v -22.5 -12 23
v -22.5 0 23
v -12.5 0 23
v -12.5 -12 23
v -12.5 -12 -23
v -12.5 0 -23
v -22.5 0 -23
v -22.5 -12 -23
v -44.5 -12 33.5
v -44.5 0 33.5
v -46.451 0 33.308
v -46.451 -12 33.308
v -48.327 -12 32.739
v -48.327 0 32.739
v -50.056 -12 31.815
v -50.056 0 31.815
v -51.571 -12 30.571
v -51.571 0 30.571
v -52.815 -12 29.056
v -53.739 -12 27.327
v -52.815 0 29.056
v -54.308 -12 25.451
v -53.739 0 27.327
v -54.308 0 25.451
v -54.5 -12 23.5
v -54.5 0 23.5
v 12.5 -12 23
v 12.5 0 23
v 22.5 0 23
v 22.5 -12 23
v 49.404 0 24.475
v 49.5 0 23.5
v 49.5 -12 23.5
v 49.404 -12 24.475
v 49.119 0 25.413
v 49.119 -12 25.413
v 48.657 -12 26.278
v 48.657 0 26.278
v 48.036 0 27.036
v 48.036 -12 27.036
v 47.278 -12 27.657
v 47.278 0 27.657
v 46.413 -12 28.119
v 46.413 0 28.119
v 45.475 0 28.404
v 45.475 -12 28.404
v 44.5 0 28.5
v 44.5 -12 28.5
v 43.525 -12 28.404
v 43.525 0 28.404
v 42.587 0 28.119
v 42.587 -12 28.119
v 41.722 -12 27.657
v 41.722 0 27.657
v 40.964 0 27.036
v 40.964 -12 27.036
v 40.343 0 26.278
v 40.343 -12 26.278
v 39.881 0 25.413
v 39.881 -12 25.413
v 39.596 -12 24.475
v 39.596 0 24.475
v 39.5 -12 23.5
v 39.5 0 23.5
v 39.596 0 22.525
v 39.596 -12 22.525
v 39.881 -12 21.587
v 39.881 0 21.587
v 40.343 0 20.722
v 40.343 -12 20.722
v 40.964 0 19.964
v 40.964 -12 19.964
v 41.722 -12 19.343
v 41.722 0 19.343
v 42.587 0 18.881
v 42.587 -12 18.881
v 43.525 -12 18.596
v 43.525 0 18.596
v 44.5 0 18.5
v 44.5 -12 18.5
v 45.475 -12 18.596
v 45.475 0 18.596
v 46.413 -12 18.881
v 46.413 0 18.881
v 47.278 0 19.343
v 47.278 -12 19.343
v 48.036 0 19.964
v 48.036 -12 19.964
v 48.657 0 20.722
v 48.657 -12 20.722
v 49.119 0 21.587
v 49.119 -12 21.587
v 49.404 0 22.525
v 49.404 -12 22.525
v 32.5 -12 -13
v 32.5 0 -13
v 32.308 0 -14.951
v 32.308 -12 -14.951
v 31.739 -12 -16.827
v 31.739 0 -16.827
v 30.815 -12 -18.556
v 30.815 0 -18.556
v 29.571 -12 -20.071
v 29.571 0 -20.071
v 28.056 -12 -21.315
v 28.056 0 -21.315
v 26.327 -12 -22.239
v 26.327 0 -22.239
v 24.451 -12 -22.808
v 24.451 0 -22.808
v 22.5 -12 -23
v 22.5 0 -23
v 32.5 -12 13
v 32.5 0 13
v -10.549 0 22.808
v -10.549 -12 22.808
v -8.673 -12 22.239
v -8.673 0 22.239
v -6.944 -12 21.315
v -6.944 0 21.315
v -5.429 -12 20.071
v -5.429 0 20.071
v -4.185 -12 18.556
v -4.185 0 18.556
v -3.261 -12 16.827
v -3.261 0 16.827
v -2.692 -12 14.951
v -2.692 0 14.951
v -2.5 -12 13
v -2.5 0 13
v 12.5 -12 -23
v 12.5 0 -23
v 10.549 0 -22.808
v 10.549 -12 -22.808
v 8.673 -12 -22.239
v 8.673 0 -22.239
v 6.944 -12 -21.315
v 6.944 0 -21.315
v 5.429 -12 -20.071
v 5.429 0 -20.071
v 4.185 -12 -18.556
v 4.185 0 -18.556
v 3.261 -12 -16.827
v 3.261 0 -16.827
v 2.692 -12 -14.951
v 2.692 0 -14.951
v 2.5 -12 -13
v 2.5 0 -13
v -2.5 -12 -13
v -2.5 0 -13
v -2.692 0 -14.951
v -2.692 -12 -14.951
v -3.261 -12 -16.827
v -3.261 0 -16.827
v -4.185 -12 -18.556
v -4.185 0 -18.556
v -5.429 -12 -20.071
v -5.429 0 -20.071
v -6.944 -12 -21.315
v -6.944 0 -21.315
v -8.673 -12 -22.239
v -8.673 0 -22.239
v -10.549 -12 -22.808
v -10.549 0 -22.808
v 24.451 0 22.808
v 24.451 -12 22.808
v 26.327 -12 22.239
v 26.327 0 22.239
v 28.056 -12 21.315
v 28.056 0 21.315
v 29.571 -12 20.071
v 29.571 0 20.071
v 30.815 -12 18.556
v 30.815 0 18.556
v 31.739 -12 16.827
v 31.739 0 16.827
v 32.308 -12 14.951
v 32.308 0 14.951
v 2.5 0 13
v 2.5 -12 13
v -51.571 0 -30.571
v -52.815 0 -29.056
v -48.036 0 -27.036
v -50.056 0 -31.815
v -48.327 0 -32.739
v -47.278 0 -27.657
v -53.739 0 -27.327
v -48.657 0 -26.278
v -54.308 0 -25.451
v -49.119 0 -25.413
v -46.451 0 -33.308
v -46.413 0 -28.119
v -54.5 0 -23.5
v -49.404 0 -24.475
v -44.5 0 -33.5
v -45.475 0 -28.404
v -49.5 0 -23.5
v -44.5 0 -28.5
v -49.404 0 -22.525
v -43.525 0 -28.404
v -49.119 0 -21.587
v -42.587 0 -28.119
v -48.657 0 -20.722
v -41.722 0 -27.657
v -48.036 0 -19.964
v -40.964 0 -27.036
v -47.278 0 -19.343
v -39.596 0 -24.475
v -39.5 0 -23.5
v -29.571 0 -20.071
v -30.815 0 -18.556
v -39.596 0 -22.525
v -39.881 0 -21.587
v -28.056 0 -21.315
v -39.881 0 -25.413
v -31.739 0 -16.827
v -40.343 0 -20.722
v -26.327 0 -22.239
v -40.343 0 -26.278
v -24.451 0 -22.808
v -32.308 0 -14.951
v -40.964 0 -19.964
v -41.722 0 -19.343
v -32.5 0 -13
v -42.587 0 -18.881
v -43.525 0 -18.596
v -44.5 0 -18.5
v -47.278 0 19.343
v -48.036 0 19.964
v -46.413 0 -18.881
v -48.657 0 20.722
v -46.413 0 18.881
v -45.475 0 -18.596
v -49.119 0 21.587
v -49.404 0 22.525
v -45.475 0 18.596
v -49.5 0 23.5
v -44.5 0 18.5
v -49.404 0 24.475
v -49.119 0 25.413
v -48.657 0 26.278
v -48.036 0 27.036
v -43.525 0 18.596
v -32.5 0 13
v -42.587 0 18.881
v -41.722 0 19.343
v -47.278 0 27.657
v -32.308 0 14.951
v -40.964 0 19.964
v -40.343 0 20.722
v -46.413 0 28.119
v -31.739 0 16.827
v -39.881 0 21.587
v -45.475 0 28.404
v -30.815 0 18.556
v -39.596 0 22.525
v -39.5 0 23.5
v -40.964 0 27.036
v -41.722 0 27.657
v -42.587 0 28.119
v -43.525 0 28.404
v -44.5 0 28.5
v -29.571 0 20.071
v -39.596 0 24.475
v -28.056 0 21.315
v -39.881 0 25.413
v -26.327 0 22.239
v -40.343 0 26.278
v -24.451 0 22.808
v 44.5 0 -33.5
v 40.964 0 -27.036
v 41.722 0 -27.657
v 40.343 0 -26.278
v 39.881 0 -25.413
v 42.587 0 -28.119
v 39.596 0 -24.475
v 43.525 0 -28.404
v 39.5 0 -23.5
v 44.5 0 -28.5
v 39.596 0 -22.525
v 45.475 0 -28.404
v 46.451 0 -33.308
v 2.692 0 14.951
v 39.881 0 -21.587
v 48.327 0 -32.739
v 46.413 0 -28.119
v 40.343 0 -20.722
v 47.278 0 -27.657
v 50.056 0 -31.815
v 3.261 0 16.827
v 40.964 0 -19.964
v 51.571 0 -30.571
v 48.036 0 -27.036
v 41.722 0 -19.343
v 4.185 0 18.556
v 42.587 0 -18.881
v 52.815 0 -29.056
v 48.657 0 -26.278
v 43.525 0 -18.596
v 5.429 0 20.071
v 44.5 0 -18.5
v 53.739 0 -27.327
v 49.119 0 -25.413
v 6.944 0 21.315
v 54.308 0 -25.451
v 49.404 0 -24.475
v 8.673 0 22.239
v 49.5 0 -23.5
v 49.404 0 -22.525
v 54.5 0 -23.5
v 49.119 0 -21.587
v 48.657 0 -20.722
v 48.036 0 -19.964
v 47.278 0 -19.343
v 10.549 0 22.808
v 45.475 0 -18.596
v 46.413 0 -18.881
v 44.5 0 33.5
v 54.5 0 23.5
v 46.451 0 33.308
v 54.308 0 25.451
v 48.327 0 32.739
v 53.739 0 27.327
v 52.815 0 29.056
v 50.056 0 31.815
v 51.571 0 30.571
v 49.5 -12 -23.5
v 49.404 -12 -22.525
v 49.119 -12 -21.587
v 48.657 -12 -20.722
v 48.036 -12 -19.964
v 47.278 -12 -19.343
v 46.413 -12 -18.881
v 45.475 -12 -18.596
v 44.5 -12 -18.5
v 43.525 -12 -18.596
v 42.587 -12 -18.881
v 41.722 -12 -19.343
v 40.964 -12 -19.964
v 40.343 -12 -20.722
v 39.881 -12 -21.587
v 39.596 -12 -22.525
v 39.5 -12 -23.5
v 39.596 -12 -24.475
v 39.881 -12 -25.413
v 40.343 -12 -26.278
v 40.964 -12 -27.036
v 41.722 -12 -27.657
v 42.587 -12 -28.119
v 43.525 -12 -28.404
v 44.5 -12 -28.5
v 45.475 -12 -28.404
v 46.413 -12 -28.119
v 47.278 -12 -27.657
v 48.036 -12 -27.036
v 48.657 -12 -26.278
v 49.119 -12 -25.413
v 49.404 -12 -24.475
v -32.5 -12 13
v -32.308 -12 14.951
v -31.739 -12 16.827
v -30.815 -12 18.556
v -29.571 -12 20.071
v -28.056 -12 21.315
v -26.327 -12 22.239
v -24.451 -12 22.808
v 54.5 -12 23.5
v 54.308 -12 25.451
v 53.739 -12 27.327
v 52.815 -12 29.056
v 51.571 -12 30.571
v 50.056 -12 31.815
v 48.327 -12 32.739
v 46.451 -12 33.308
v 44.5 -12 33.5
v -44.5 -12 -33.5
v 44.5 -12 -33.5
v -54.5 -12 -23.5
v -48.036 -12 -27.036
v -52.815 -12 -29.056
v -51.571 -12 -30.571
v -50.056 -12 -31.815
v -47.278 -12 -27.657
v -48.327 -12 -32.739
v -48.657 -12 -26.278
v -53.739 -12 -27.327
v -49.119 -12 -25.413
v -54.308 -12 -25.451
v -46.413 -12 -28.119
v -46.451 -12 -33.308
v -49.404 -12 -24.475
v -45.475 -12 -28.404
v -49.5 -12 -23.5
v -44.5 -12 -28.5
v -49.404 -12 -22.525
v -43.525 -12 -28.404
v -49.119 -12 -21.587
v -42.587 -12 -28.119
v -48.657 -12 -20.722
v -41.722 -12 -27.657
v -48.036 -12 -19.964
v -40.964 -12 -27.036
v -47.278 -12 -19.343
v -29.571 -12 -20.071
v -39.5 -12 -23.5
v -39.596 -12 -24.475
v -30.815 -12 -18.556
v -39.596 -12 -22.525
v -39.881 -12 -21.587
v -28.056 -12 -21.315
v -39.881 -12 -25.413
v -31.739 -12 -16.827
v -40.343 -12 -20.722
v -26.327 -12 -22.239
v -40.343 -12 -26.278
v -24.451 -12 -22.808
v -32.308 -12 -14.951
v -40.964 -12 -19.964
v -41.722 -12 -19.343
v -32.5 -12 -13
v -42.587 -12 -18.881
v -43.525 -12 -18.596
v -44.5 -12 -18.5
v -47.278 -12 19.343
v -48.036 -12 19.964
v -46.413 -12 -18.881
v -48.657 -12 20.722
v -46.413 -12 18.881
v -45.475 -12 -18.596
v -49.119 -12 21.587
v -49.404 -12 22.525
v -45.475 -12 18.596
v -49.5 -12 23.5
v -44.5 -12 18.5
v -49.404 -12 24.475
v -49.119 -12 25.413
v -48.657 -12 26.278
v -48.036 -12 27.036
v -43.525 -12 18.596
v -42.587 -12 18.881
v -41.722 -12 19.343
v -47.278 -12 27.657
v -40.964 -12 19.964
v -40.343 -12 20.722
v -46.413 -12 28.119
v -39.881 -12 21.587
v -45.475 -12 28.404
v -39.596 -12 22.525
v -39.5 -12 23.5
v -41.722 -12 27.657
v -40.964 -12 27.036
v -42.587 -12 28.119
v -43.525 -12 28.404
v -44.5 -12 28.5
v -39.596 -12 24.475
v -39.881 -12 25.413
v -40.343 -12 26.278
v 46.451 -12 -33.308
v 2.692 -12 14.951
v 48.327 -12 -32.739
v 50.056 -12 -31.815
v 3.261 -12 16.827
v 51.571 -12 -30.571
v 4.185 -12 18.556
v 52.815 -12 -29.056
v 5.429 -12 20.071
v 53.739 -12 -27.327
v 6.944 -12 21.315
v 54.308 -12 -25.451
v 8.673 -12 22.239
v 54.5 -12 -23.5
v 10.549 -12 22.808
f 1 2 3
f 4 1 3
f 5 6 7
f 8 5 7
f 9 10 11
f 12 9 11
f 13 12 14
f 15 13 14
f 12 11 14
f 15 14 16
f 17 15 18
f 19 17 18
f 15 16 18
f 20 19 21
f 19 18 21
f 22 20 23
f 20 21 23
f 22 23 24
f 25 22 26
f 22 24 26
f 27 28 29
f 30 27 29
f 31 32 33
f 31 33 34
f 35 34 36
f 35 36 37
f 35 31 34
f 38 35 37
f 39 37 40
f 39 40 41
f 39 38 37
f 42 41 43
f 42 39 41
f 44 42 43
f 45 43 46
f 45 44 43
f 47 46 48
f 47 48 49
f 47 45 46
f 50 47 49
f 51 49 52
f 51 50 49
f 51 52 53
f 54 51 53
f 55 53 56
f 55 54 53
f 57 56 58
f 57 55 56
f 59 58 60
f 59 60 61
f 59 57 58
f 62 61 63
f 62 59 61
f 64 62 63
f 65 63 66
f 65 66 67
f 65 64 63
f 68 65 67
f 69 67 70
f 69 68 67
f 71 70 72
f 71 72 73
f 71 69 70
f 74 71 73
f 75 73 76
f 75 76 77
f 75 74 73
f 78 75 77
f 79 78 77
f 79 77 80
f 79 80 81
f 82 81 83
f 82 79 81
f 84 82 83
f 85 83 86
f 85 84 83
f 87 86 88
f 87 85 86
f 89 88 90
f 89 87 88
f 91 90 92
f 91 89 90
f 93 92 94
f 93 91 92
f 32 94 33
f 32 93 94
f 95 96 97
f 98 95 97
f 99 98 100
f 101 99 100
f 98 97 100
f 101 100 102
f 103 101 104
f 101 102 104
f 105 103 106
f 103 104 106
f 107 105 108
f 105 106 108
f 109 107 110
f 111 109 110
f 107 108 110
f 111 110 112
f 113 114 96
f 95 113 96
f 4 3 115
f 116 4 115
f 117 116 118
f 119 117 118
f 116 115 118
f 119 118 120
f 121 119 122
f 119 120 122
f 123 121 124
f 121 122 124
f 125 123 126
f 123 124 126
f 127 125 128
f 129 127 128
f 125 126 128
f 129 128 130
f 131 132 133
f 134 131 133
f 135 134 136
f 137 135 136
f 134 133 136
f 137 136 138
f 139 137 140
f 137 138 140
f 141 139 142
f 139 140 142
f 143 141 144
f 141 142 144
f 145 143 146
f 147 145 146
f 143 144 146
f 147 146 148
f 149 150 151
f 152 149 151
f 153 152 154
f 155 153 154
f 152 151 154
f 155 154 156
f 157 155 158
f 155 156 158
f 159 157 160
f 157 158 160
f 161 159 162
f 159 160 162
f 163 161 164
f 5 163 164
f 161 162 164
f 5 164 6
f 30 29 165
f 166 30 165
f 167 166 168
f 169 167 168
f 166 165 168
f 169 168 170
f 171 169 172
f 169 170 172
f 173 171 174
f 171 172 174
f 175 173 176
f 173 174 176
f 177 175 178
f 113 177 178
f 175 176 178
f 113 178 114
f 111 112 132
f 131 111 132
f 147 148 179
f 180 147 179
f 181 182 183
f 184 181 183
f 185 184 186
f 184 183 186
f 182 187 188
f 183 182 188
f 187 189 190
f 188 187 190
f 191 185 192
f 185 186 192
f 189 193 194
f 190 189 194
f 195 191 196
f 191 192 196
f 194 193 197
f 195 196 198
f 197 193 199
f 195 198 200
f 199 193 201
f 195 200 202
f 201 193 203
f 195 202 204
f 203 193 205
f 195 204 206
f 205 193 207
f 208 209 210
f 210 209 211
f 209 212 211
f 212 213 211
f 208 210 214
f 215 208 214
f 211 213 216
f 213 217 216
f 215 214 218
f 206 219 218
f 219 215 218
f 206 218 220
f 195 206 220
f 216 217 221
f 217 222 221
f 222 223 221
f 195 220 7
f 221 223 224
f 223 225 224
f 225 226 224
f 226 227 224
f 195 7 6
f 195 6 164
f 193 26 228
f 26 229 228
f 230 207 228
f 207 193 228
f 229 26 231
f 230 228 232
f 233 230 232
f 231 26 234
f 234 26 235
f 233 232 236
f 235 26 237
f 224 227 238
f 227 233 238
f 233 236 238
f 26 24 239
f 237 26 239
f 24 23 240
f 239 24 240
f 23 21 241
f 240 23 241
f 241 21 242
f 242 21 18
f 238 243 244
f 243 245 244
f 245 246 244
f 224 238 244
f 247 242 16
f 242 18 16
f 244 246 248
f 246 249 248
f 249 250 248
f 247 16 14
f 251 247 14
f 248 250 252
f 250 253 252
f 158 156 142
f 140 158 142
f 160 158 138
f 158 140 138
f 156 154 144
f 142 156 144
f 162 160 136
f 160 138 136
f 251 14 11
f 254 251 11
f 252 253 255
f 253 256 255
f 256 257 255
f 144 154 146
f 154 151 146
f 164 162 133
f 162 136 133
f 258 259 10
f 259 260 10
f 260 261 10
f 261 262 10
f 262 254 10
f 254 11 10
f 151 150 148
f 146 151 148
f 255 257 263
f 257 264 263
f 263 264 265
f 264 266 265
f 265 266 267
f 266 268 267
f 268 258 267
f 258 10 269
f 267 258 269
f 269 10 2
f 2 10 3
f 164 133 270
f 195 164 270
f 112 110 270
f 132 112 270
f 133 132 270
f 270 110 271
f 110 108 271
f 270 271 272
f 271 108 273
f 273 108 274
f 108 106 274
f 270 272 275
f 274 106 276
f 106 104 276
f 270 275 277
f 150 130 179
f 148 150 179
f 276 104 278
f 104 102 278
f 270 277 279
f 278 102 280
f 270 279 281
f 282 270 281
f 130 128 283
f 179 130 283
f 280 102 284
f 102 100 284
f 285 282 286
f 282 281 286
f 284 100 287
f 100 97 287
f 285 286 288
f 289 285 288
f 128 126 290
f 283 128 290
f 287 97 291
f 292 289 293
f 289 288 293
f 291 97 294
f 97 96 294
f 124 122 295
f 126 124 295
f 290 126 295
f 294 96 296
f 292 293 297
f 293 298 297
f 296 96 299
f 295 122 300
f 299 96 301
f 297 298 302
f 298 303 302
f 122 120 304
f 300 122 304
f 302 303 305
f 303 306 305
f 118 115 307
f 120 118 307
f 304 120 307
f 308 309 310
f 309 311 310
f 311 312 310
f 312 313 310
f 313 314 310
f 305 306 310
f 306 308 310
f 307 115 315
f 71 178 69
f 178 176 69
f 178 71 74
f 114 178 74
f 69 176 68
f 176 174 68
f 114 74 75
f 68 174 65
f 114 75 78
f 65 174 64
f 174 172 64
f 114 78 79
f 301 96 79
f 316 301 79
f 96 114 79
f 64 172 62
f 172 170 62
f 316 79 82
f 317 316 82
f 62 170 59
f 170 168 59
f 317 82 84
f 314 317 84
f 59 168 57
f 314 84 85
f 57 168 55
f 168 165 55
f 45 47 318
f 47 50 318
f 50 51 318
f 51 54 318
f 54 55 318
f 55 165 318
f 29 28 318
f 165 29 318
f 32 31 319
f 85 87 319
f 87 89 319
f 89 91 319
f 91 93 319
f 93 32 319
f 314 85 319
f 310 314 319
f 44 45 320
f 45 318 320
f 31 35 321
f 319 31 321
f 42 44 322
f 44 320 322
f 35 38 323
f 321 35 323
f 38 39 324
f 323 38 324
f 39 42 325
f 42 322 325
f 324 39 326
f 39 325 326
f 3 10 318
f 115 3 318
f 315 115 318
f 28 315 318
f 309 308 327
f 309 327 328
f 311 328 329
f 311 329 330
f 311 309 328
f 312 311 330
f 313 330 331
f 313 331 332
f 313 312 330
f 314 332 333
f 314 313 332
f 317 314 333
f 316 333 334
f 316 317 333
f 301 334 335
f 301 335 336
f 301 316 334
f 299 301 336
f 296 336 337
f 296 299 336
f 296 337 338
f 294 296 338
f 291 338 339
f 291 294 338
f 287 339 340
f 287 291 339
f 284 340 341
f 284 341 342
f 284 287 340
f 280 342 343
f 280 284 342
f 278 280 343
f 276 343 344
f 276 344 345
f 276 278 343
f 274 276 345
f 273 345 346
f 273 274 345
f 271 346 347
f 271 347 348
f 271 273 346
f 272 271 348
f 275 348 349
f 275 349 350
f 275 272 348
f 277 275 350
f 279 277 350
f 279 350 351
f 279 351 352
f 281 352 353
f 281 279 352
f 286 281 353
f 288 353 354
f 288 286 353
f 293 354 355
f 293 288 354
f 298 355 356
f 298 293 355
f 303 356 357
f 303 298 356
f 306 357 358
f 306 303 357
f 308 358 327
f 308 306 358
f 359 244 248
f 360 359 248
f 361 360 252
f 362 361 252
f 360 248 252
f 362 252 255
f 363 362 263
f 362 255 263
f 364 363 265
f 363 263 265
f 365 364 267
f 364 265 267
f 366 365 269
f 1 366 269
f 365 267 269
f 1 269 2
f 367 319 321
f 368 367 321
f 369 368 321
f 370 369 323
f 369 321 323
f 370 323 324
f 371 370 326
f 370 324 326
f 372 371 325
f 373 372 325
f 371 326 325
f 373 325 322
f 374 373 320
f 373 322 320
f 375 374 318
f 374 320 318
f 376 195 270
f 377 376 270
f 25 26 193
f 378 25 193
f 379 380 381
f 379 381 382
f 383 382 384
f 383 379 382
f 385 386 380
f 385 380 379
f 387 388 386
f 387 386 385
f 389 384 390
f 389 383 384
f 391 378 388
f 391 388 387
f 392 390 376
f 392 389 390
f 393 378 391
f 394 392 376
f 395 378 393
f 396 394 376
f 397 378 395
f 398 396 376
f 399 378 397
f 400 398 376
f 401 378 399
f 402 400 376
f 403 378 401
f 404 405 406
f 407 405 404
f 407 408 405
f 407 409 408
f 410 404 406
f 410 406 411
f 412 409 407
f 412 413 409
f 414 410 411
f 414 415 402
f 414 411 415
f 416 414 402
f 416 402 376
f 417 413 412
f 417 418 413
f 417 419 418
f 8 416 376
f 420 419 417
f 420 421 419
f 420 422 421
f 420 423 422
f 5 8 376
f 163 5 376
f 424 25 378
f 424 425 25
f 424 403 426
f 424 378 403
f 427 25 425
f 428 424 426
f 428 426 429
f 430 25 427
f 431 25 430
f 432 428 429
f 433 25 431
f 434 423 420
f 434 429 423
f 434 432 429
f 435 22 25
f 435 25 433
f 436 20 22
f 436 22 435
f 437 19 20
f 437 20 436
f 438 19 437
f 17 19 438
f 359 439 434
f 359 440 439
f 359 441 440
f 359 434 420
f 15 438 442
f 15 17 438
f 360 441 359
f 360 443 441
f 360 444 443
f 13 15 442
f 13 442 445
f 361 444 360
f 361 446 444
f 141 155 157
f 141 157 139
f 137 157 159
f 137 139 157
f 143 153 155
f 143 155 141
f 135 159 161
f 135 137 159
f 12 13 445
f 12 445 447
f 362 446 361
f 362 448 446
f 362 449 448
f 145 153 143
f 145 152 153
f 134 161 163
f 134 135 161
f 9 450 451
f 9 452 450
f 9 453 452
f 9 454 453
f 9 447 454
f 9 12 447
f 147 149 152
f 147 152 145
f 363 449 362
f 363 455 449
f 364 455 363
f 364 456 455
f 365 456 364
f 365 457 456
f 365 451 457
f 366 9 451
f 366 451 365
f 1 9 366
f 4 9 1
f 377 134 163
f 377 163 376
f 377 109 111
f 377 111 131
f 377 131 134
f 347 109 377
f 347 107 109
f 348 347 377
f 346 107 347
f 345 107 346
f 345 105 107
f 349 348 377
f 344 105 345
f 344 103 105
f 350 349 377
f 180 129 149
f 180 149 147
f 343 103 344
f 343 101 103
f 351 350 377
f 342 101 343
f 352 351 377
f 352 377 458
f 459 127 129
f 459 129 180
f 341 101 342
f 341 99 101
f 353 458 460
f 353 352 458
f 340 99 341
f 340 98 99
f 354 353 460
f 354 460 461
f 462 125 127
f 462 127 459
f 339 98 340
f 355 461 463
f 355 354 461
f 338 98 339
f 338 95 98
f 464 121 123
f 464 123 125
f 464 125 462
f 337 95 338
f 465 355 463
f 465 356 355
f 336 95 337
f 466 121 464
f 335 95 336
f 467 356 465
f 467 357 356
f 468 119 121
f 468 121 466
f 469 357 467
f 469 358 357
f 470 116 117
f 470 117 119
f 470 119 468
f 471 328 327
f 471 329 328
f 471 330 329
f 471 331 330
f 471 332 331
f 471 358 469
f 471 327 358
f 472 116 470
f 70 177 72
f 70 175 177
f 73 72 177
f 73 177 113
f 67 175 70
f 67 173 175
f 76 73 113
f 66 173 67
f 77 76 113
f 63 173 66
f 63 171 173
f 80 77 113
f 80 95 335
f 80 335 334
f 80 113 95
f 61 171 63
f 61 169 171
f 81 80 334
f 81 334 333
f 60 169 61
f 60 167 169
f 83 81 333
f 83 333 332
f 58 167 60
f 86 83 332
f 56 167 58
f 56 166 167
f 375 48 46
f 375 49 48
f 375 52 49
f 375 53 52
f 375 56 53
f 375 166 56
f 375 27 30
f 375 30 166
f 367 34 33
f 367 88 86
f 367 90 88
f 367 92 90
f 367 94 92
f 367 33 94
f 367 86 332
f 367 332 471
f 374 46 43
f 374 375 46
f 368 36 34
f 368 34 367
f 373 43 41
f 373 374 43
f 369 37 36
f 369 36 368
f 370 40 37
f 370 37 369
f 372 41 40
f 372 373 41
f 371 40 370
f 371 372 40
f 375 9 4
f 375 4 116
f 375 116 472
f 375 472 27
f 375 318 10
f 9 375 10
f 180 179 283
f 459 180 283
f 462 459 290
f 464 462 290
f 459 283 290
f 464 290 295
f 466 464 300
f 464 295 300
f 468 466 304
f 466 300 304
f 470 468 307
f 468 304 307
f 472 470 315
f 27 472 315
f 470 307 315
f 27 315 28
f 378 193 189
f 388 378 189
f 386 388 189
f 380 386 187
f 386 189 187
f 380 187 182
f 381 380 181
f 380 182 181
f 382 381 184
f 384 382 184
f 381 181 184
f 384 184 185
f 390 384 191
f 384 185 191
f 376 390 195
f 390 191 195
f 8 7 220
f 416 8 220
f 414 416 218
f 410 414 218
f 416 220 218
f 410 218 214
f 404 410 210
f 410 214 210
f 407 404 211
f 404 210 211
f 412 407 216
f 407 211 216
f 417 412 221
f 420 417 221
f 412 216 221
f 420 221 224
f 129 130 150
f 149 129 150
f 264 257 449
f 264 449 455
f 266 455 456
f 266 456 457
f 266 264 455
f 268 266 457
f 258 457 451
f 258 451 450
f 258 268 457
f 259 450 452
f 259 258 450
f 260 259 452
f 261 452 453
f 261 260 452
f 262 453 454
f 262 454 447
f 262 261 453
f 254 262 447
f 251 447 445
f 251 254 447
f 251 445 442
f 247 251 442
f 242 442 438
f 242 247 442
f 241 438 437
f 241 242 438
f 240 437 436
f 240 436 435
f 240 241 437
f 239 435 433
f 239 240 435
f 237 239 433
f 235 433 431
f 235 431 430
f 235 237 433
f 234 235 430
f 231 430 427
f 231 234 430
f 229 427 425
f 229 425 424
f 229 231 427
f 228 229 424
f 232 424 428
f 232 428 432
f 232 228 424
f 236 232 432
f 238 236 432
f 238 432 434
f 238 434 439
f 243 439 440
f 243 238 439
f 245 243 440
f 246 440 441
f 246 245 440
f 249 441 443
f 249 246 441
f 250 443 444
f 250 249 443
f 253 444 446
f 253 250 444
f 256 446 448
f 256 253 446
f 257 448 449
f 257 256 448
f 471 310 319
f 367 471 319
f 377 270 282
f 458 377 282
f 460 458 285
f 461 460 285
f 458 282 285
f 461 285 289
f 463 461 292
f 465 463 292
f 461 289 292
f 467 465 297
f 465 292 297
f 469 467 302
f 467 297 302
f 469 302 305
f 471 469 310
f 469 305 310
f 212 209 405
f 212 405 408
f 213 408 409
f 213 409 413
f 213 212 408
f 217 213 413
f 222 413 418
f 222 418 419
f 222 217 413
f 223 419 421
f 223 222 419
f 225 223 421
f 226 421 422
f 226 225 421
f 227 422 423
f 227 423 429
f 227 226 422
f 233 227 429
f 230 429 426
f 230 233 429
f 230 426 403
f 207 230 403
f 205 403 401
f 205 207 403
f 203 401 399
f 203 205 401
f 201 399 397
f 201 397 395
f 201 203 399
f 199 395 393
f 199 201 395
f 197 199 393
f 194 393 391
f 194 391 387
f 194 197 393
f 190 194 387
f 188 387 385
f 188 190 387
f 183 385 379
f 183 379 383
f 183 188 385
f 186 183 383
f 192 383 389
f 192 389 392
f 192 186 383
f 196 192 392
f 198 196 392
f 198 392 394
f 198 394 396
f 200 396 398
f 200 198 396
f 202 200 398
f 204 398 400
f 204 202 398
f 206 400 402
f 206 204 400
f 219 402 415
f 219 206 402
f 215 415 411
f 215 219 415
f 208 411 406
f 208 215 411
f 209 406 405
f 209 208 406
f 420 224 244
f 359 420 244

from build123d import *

# Parameters (mm, degrees)
F0_R     = 5
F1_DEPTH = 12


with BuildPart() as f1:
    # F0 (on Front) → F1 (new body)
    with BuildSketch(Plane.XZ):
        with BuildLine():
            Line((44.5, 33.5), (-44.5, 33.5))
            ThreePointArc((-44.5, 33.5), (-51.571068, 30.571068), (-54.5, 23.5))
            Line((-54.5, 23.5), (-54.5, -23.5))
            ThreePointArc((-54.5, -23.5), (-51.571068, -30.571068), (-44.5, -33.5))
            Line((-44.5, -33.5), (44.5, -33.5))
            ThreePointArc((44.5, -33.5), (51.571068, -30.571068), (54.5, -23.5))
            Line((54.5, -23.5), (54.5, 23.5))
            ThreePointArc((54.5, 23.5), (51.571068, 30.571068), (44.5, 33.5))
        make_face()
        with Locations((-44.5, -23.5)):
            Circle(F0_R, mode=Mode.SUBTRACT)
        with Locations((44.5, -23.5)):
            Circle(F0_R, mode=Mode.SUBTRACT)
        with BuildLine():
            Line((-2.5, 13), (-2.5, 0))
            Line((-2.5, 0), (-2.5, -13))
            ThreePointArc((-2.5, -13), (-5.428932, -20.071068), (-12.5, -23))
            Line((-12.5, -23), (-22.5, -23))
            ThreePointArc((-22.5, -23), (-29.571068, -20.071068), (-32.5, -13))
            Line((-32.5, -13), (-32.5, 0))
            Line((-32.5, 0), (-32.5, 13))
            ThreePointArc((-32.5, 13), (-29.571068, 20.071068), (-22.5, 23))
            Line((-22.5, 23), (-12.5, 23))
            ThreePointArc((-12.5, 23), (-5.428932, 20.071068), (-2.5, 13))
        make_face(mode=Mode.SUBTRACT)
        with Locations((-44.5, 23.5)):
            Circle(F0_R, mode=Mode.SUBTRACT)
        with BuildLine():
            ThreePointArc((22.5, 23), (29.571068, 20.071068), (32.5, 13))
            Line((32.5, 13), (32.5, -13))
            ThreePointArc((32.5, -13), (29.571068, -20.071068), (22.5, -23))
            Line((22.5, -23), (12.5, -23))
            ThreePointArc((12.5, -23), (5.428932, -20.071068), (2.5, -13))
            Line((2.5, -13), (2.5, 0))
            Line((2.5, 0), (2.5, 13))
            ThreePointArc((2.5, 13), (5.428932, 20.071068), (12.5, 23))
            Line((12.5, 23), (22.5, 23))
        make_face(mode=Mode.SUBTRACT)
        with Locations((44.5, 23.5)):
            Circle(F0_R, mode=Mode.SUBTRACT)
    extrude(amount=F1_DEPTH)


solid = f1.part
